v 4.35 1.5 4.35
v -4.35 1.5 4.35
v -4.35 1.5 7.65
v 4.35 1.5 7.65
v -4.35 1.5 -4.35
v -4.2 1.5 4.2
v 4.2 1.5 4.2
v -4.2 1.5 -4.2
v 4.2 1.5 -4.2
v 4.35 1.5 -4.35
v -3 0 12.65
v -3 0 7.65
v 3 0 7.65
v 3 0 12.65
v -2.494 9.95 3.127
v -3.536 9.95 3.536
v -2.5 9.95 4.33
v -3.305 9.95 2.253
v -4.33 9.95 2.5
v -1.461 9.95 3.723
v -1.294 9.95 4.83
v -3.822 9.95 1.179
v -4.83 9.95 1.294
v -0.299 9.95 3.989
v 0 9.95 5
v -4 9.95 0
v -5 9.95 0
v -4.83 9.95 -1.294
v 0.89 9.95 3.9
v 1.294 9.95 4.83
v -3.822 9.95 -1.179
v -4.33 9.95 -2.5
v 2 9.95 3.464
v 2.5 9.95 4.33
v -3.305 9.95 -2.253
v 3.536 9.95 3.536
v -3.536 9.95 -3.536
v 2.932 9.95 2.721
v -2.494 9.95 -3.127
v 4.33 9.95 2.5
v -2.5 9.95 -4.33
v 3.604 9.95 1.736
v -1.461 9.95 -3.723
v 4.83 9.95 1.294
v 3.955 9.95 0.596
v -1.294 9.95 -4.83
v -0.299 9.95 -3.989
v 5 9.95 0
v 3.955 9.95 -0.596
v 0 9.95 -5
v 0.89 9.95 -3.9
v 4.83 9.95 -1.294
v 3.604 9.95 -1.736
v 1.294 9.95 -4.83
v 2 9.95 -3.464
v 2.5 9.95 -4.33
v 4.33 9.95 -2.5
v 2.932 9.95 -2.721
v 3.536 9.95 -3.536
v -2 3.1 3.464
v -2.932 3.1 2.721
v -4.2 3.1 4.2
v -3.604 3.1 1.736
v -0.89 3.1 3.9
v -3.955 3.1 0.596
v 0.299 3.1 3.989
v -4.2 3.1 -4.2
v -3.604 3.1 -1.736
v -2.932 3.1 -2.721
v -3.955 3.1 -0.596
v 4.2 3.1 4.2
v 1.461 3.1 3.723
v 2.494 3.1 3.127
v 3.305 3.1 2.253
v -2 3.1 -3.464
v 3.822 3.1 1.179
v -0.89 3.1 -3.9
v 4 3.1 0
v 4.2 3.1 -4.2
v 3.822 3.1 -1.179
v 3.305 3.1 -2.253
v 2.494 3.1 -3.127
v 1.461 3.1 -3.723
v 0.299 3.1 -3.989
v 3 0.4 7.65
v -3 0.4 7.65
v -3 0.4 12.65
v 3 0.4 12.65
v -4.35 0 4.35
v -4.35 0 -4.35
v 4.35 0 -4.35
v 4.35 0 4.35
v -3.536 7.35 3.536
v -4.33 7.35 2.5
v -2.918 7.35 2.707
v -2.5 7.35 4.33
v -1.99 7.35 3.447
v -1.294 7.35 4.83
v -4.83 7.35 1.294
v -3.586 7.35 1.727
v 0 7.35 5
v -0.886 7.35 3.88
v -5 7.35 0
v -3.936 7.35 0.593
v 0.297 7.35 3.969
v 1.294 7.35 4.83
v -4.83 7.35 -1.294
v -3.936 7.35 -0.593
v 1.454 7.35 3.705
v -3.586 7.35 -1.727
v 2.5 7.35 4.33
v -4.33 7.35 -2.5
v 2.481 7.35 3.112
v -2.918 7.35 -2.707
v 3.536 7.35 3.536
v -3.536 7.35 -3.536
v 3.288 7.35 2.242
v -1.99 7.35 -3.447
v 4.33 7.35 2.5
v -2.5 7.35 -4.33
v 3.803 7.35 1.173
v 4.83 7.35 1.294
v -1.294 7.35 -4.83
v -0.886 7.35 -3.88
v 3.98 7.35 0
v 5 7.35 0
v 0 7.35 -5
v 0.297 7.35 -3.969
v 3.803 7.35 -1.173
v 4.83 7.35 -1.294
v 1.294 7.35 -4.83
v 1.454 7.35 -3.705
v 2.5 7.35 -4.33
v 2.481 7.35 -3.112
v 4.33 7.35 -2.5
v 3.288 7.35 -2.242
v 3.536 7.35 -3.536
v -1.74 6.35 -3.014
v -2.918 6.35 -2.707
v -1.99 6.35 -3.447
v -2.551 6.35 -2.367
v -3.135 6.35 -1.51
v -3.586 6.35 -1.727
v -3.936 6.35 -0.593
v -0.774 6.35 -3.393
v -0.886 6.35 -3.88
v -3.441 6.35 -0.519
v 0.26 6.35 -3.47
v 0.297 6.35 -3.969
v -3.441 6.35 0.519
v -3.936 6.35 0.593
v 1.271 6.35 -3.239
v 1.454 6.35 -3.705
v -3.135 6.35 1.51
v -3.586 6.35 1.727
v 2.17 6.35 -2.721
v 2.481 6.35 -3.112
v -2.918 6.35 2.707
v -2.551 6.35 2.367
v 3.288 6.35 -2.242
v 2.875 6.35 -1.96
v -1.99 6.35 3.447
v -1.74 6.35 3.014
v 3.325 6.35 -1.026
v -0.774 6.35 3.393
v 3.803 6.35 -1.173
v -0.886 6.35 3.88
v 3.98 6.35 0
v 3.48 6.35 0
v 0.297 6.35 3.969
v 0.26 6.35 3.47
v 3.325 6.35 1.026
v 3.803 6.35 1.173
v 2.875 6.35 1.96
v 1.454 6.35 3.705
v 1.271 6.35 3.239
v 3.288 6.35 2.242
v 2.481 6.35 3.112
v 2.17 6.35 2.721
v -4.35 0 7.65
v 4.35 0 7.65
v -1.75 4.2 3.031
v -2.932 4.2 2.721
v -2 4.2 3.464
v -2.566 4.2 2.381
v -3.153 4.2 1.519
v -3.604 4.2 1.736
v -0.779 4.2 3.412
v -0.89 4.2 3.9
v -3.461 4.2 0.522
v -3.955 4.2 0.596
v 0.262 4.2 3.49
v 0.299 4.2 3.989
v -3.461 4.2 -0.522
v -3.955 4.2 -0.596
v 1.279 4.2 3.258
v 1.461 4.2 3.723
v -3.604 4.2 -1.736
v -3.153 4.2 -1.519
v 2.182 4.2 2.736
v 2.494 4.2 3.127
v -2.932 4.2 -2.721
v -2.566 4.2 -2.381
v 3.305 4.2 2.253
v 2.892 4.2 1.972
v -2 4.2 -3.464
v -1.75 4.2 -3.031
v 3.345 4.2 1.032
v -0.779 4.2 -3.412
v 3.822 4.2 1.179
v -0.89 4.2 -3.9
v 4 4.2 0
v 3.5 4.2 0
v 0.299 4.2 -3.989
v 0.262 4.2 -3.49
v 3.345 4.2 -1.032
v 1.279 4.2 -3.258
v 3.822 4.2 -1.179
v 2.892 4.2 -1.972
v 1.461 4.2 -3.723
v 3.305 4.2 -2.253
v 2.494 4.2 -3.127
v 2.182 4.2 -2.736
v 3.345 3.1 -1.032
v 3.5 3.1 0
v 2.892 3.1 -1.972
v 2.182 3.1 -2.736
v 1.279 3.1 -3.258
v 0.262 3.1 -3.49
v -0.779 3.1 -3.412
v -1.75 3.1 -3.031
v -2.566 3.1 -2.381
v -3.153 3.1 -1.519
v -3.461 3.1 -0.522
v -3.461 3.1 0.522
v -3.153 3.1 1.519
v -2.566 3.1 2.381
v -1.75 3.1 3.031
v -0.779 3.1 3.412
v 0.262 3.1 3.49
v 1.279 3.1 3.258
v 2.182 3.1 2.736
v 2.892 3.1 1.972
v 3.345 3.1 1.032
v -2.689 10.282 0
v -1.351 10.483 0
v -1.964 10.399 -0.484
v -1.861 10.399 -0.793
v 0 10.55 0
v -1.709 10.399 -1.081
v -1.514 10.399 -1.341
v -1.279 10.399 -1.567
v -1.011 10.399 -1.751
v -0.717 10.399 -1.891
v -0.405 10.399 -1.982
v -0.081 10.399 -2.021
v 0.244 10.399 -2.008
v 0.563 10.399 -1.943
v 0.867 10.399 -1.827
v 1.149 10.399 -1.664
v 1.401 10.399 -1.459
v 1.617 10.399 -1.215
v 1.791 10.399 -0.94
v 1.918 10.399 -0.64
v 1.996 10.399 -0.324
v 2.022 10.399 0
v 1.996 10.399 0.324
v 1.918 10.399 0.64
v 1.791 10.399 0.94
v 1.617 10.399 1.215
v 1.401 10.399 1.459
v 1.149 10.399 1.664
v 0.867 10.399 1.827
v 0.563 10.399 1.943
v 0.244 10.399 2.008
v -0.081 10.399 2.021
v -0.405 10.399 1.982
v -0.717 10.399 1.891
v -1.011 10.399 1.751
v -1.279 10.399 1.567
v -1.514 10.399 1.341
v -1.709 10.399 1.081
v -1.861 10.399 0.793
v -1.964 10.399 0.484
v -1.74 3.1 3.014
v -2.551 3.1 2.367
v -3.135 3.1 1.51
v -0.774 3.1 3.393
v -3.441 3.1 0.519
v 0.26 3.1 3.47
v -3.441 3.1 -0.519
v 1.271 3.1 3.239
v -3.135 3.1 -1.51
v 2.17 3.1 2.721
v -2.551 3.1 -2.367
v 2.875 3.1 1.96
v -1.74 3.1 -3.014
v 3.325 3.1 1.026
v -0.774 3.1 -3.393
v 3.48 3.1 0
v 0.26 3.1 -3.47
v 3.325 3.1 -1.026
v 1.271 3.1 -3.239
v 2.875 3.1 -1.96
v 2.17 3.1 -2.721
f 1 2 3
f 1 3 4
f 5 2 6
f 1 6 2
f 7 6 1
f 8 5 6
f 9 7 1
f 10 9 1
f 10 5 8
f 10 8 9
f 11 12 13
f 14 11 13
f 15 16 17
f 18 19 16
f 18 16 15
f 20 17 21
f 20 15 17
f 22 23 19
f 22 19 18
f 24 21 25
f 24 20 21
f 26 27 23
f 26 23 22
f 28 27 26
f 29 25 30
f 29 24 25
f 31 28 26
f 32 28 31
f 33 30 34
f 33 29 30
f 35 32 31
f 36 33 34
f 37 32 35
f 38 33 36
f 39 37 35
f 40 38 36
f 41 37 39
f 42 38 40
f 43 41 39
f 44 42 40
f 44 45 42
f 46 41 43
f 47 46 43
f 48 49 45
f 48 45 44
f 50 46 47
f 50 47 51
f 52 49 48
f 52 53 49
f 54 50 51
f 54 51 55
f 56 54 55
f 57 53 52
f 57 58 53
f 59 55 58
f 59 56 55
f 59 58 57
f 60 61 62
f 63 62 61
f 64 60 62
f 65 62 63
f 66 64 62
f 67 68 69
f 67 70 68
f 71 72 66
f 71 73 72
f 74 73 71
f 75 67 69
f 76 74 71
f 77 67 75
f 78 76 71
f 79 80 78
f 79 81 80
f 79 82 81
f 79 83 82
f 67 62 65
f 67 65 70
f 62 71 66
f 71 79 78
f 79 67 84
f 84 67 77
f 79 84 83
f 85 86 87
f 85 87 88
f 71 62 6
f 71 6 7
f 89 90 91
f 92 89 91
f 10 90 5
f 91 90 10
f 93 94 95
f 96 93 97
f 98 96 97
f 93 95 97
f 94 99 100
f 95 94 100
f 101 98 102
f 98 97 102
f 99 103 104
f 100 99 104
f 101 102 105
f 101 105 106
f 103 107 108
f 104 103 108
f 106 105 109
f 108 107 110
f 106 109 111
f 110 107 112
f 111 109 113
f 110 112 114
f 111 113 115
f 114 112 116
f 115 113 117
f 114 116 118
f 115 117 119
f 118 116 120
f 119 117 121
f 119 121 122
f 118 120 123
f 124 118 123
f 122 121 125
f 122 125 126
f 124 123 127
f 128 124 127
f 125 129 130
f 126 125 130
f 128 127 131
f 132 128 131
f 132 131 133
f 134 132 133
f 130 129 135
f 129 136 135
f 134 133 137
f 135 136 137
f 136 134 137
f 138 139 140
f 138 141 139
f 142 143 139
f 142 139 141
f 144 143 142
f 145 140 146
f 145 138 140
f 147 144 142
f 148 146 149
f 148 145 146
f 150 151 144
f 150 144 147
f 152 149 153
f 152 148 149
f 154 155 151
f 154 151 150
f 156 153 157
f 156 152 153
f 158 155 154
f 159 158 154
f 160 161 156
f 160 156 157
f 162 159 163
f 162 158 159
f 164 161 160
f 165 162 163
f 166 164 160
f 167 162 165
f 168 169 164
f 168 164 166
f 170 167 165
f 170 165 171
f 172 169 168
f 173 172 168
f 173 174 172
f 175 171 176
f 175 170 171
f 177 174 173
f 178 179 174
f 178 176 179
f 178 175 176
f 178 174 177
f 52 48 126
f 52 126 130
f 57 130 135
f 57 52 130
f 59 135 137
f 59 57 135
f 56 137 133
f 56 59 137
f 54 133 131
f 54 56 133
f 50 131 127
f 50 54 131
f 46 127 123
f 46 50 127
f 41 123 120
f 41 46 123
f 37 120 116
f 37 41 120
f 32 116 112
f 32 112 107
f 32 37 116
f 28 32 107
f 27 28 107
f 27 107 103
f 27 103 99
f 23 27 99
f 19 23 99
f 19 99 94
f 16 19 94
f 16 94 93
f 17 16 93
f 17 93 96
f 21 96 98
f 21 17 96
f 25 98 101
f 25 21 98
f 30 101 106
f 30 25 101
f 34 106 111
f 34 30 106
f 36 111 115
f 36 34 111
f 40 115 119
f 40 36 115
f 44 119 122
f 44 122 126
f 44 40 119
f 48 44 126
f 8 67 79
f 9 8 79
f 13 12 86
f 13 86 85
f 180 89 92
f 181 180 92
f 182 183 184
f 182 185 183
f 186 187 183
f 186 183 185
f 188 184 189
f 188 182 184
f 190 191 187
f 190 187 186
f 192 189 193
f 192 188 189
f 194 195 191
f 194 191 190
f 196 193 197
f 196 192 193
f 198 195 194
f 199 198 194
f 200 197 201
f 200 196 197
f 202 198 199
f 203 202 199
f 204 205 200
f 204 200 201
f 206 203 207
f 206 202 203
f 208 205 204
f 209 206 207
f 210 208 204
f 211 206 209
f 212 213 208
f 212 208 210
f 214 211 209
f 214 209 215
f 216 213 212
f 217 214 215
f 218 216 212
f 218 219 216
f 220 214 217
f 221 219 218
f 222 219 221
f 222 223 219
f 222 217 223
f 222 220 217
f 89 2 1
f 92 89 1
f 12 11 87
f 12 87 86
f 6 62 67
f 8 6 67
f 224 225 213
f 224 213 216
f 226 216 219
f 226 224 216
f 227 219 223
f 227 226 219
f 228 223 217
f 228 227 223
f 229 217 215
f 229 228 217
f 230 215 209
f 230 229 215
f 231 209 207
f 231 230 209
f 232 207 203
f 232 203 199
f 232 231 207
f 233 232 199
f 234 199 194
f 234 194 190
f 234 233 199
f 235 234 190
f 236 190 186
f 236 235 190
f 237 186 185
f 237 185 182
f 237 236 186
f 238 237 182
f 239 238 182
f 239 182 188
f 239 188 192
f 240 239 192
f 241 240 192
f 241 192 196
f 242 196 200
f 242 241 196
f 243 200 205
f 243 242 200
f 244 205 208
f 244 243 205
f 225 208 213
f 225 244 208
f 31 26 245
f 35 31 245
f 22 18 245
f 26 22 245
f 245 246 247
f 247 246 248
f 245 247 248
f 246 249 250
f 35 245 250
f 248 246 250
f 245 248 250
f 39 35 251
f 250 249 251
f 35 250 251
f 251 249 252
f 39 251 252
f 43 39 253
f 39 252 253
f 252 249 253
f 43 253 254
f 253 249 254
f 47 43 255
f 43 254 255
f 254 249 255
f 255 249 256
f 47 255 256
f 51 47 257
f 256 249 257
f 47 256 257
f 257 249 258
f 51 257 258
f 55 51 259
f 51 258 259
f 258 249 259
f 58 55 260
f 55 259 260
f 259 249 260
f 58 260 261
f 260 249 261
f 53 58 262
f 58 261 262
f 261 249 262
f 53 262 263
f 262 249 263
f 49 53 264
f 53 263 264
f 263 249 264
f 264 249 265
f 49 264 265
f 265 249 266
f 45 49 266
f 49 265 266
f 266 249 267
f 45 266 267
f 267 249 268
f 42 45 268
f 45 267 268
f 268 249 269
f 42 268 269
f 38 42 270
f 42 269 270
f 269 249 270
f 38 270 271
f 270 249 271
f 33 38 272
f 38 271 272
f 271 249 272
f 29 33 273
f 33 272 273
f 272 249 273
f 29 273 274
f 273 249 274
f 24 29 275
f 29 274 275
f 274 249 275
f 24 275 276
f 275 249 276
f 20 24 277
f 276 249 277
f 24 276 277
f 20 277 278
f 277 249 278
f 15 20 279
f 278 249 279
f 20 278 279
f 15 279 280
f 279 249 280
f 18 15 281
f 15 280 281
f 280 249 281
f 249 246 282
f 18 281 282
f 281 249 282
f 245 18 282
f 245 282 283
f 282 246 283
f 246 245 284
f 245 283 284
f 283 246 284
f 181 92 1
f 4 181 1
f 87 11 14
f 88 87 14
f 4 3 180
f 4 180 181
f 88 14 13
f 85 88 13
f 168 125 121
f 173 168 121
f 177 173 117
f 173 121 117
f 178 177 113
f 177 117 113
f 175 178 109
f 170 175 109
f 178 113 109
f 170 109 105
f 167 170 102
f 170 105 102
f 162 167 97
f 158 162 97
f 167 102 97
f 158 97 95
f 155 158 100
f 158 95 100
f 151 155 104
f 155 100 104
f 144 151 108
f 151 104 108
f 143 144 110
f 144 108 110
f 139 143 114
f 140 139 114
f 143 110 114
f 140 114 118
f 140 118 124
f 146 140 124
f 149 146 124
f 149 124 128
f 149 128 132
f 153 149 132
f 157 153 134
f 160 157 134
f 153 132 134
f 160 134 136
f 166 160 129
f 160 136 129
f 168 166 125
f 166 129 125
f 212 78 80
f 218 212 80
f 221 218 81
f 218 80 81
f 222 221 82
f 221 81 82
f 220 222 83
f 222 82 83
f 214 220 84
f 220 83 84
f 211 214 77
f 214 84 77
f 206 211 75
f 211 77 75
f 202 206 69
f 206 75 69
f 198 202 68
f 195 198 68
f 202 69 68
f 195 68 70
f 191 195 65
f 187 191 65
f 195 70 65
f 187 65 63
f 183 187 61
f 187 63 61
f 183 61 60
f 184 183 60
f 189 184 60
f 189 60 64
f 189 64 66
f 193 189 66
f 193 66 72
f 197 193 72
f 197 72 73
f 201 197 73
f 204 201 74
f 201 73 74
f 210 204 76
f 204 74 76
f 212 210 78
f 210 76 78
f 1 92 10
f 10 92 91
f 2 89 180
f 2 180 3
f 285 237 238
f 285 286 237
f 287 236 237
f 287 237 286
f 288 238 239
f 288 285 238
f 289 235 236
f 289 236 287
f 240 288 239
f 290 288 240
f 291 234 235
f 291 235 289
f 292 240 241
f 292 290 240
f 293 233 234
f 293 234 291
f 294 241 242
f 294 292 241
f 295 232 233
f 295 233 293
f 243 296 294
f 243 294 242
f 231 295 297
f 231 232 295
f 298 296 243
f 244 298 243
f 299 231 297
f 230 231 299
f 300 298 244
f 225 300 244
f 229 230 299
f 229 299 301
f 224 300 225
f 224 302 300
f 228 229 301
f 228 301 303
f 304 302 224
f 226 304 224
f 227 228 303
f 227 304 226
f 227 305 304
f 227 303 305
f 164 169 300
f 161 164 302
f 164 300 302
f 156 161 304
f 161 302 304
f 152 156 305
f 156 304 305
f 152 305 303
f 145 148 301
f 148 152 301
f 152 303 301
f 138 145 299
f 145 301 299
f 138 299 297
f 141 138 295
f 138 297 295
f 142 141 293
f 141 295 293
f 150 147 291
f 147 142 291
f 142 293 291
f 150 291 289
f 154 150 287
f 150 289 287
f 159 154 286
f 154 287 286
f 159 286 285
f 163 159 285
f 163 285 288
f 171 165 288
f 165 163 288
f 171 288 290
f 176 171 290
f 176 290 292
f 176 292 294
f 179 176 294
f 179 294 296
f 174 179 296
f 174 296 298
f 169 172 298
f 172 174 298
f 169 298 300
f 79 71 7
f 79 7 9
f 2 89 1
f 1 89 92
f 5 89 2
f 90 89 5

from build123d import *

# Parameters (mm, degrees)
SKETCH_1_W          = 8.7
SKETCH_1_H          = 8.7
EXTRUDE_1_DEPTH     = 3.1
SKETCH_2_R          = 4
SKETCH_2_R_2        = 3.5
EXTRUDE_2_DEPTH     = 1.1
SKETCH_3_R          = 3.48
EXTRUDE_3_DEPTH     = 6.85
SKETCH_4_R          = 5
EXTRUDE_4_DEPTH     = 2.6
SKETCH_5_W          = 8.7
SKETCH_5_H          = 1.5
EXTRUDE_5_DEPTH     = 3.3
SKETCH_10_W         = 6
SKETCH_10_H         = 5
EXTRUDE_6_DEPTH     = 0.4
SKETCH_13_W         = 8.7
SKETCH_13_H         = 8.7
SKETCH_13_W_2       = 8.4
SKETCH_13_H_2       = 8.4
CUT_EXTRUDE_1_DEPTH = 1.6
SKETCH_14_R         = 3.98
SKETCH_14_R_2       = 3.48
EXTRUDE_7_DEPTH     = 1


with BuildPart() as part:
    # 草图1 → 凸台-拉伸1 (new body)
    with BuildSketch(Plane(origin=(0, 0, 0), x_dir=(1, 0, 0), z_dir=(0, 1, 0))):
        Rectangle(SKETCH_1_W, SKETCH_1_H)
    extrude(amount=EXTRUDE_1_DEPTH)

    # 草图2 → 凸台-拉伸2 (add)
    with BuildSketch(Plane(origin=(0, 3.1, 0), x_dir=(1, 0, 0), z_dir=(0, 1, 0))):
        Circle(SKETCH_2_R)
        Circle(SKETCH_2_R_2, mode=Mode.SUBTRACT)
    extrude(amount=EXTRUDE_2_DEPTH)

    # 草图3 → 凸台-拉伸3 (add)
    with BuildSketch(Plane(origin=(0, 3.1, 0), x_dir=(1, 0, 0), z_dir=(0, 1, 0))):
        Circle(SKETCH_3_R)
    extrude(amount=EXTRUDE_3_DEPTH)

    # 草图4 → 凸台-拉伸4 (add)
    with BuildSketch(Plane(origin=(0, 9.95, 0), x_dir=(1, 0, 0), z_dir=(0, 1, 0))):
        Circle(SKETCH_4_R)
    extrude(amount=-EXTRUDE_4_DEPTH)

    # 草图13 → 切除-拉伸1 (cut)
    with BuildSketch(Plane(origin=(0, 3.1, 0), x_dir=(1, 0, 0), z_dir=(0, 1, 0))):
        Rectangle(SKETCH_13_W, SKETCH_13_H)
        Rectangle(SKETCH_13_W_2, SKETCH_13_H_2, mode=Mode.SUBTRACT)
    extrude(amount=-CUT_EXTRUDE_1_DEPTH, mode=Mode.SUBTRACT)

    # 草图14 → 凸台-拉伸7 (add)
    with BuildSketch(Plane.XZ.offset(-7.35)):
        Circle(SKETCH_14_R)
        Circle(SKETCH_14_R_2, mode=Mode.SUBTRACT)
    extrude(amount=EXTRUDE_7_DEPTH)

    # 草图11 → 旋转3 (revolve)
    with BuildSketch(Plane.XY):
        with BuildLine():
            Line((0, 9.95), (-4, 9.95))
            ThreePointArc((-4, 9.95), (-2.022374842, 10.399165611), (0, 10.55))
            Line((0, 10.55), (0, 9.95))
        make_face()
    revolve(axis=Axis((0, 9.95, 0), (0, -1, 0)))


with BuildPart() as body_2:
    # 草图5 → 凸台-拉伸5 (new body)
    with BuildSketch(Plane.XY.offset(4.35)):
        with Locations((0, 0.75)):
            Rectangle(SKETCH_5_W, SKETCH_5_H)
    extrude(amount=EXTRUDE_5_DEPTH)


with BuildPart() as body_3:
    # 草图10 → 凸台-拉伸6 (new body)
    with BuildSketch(Plane(origin=(0, 0, 0), x_dir=(1, 0, 0), z_dir=(0, 1, 0))):
        with Locations((0, -10.15)):
            Rectangle(SKETCH_10_W, SKETCH_10_H)
    extrude(amount=EXTRUDE_6_DEPTH)


solid = Compound([part.part, body_2.part, body_3.part])
